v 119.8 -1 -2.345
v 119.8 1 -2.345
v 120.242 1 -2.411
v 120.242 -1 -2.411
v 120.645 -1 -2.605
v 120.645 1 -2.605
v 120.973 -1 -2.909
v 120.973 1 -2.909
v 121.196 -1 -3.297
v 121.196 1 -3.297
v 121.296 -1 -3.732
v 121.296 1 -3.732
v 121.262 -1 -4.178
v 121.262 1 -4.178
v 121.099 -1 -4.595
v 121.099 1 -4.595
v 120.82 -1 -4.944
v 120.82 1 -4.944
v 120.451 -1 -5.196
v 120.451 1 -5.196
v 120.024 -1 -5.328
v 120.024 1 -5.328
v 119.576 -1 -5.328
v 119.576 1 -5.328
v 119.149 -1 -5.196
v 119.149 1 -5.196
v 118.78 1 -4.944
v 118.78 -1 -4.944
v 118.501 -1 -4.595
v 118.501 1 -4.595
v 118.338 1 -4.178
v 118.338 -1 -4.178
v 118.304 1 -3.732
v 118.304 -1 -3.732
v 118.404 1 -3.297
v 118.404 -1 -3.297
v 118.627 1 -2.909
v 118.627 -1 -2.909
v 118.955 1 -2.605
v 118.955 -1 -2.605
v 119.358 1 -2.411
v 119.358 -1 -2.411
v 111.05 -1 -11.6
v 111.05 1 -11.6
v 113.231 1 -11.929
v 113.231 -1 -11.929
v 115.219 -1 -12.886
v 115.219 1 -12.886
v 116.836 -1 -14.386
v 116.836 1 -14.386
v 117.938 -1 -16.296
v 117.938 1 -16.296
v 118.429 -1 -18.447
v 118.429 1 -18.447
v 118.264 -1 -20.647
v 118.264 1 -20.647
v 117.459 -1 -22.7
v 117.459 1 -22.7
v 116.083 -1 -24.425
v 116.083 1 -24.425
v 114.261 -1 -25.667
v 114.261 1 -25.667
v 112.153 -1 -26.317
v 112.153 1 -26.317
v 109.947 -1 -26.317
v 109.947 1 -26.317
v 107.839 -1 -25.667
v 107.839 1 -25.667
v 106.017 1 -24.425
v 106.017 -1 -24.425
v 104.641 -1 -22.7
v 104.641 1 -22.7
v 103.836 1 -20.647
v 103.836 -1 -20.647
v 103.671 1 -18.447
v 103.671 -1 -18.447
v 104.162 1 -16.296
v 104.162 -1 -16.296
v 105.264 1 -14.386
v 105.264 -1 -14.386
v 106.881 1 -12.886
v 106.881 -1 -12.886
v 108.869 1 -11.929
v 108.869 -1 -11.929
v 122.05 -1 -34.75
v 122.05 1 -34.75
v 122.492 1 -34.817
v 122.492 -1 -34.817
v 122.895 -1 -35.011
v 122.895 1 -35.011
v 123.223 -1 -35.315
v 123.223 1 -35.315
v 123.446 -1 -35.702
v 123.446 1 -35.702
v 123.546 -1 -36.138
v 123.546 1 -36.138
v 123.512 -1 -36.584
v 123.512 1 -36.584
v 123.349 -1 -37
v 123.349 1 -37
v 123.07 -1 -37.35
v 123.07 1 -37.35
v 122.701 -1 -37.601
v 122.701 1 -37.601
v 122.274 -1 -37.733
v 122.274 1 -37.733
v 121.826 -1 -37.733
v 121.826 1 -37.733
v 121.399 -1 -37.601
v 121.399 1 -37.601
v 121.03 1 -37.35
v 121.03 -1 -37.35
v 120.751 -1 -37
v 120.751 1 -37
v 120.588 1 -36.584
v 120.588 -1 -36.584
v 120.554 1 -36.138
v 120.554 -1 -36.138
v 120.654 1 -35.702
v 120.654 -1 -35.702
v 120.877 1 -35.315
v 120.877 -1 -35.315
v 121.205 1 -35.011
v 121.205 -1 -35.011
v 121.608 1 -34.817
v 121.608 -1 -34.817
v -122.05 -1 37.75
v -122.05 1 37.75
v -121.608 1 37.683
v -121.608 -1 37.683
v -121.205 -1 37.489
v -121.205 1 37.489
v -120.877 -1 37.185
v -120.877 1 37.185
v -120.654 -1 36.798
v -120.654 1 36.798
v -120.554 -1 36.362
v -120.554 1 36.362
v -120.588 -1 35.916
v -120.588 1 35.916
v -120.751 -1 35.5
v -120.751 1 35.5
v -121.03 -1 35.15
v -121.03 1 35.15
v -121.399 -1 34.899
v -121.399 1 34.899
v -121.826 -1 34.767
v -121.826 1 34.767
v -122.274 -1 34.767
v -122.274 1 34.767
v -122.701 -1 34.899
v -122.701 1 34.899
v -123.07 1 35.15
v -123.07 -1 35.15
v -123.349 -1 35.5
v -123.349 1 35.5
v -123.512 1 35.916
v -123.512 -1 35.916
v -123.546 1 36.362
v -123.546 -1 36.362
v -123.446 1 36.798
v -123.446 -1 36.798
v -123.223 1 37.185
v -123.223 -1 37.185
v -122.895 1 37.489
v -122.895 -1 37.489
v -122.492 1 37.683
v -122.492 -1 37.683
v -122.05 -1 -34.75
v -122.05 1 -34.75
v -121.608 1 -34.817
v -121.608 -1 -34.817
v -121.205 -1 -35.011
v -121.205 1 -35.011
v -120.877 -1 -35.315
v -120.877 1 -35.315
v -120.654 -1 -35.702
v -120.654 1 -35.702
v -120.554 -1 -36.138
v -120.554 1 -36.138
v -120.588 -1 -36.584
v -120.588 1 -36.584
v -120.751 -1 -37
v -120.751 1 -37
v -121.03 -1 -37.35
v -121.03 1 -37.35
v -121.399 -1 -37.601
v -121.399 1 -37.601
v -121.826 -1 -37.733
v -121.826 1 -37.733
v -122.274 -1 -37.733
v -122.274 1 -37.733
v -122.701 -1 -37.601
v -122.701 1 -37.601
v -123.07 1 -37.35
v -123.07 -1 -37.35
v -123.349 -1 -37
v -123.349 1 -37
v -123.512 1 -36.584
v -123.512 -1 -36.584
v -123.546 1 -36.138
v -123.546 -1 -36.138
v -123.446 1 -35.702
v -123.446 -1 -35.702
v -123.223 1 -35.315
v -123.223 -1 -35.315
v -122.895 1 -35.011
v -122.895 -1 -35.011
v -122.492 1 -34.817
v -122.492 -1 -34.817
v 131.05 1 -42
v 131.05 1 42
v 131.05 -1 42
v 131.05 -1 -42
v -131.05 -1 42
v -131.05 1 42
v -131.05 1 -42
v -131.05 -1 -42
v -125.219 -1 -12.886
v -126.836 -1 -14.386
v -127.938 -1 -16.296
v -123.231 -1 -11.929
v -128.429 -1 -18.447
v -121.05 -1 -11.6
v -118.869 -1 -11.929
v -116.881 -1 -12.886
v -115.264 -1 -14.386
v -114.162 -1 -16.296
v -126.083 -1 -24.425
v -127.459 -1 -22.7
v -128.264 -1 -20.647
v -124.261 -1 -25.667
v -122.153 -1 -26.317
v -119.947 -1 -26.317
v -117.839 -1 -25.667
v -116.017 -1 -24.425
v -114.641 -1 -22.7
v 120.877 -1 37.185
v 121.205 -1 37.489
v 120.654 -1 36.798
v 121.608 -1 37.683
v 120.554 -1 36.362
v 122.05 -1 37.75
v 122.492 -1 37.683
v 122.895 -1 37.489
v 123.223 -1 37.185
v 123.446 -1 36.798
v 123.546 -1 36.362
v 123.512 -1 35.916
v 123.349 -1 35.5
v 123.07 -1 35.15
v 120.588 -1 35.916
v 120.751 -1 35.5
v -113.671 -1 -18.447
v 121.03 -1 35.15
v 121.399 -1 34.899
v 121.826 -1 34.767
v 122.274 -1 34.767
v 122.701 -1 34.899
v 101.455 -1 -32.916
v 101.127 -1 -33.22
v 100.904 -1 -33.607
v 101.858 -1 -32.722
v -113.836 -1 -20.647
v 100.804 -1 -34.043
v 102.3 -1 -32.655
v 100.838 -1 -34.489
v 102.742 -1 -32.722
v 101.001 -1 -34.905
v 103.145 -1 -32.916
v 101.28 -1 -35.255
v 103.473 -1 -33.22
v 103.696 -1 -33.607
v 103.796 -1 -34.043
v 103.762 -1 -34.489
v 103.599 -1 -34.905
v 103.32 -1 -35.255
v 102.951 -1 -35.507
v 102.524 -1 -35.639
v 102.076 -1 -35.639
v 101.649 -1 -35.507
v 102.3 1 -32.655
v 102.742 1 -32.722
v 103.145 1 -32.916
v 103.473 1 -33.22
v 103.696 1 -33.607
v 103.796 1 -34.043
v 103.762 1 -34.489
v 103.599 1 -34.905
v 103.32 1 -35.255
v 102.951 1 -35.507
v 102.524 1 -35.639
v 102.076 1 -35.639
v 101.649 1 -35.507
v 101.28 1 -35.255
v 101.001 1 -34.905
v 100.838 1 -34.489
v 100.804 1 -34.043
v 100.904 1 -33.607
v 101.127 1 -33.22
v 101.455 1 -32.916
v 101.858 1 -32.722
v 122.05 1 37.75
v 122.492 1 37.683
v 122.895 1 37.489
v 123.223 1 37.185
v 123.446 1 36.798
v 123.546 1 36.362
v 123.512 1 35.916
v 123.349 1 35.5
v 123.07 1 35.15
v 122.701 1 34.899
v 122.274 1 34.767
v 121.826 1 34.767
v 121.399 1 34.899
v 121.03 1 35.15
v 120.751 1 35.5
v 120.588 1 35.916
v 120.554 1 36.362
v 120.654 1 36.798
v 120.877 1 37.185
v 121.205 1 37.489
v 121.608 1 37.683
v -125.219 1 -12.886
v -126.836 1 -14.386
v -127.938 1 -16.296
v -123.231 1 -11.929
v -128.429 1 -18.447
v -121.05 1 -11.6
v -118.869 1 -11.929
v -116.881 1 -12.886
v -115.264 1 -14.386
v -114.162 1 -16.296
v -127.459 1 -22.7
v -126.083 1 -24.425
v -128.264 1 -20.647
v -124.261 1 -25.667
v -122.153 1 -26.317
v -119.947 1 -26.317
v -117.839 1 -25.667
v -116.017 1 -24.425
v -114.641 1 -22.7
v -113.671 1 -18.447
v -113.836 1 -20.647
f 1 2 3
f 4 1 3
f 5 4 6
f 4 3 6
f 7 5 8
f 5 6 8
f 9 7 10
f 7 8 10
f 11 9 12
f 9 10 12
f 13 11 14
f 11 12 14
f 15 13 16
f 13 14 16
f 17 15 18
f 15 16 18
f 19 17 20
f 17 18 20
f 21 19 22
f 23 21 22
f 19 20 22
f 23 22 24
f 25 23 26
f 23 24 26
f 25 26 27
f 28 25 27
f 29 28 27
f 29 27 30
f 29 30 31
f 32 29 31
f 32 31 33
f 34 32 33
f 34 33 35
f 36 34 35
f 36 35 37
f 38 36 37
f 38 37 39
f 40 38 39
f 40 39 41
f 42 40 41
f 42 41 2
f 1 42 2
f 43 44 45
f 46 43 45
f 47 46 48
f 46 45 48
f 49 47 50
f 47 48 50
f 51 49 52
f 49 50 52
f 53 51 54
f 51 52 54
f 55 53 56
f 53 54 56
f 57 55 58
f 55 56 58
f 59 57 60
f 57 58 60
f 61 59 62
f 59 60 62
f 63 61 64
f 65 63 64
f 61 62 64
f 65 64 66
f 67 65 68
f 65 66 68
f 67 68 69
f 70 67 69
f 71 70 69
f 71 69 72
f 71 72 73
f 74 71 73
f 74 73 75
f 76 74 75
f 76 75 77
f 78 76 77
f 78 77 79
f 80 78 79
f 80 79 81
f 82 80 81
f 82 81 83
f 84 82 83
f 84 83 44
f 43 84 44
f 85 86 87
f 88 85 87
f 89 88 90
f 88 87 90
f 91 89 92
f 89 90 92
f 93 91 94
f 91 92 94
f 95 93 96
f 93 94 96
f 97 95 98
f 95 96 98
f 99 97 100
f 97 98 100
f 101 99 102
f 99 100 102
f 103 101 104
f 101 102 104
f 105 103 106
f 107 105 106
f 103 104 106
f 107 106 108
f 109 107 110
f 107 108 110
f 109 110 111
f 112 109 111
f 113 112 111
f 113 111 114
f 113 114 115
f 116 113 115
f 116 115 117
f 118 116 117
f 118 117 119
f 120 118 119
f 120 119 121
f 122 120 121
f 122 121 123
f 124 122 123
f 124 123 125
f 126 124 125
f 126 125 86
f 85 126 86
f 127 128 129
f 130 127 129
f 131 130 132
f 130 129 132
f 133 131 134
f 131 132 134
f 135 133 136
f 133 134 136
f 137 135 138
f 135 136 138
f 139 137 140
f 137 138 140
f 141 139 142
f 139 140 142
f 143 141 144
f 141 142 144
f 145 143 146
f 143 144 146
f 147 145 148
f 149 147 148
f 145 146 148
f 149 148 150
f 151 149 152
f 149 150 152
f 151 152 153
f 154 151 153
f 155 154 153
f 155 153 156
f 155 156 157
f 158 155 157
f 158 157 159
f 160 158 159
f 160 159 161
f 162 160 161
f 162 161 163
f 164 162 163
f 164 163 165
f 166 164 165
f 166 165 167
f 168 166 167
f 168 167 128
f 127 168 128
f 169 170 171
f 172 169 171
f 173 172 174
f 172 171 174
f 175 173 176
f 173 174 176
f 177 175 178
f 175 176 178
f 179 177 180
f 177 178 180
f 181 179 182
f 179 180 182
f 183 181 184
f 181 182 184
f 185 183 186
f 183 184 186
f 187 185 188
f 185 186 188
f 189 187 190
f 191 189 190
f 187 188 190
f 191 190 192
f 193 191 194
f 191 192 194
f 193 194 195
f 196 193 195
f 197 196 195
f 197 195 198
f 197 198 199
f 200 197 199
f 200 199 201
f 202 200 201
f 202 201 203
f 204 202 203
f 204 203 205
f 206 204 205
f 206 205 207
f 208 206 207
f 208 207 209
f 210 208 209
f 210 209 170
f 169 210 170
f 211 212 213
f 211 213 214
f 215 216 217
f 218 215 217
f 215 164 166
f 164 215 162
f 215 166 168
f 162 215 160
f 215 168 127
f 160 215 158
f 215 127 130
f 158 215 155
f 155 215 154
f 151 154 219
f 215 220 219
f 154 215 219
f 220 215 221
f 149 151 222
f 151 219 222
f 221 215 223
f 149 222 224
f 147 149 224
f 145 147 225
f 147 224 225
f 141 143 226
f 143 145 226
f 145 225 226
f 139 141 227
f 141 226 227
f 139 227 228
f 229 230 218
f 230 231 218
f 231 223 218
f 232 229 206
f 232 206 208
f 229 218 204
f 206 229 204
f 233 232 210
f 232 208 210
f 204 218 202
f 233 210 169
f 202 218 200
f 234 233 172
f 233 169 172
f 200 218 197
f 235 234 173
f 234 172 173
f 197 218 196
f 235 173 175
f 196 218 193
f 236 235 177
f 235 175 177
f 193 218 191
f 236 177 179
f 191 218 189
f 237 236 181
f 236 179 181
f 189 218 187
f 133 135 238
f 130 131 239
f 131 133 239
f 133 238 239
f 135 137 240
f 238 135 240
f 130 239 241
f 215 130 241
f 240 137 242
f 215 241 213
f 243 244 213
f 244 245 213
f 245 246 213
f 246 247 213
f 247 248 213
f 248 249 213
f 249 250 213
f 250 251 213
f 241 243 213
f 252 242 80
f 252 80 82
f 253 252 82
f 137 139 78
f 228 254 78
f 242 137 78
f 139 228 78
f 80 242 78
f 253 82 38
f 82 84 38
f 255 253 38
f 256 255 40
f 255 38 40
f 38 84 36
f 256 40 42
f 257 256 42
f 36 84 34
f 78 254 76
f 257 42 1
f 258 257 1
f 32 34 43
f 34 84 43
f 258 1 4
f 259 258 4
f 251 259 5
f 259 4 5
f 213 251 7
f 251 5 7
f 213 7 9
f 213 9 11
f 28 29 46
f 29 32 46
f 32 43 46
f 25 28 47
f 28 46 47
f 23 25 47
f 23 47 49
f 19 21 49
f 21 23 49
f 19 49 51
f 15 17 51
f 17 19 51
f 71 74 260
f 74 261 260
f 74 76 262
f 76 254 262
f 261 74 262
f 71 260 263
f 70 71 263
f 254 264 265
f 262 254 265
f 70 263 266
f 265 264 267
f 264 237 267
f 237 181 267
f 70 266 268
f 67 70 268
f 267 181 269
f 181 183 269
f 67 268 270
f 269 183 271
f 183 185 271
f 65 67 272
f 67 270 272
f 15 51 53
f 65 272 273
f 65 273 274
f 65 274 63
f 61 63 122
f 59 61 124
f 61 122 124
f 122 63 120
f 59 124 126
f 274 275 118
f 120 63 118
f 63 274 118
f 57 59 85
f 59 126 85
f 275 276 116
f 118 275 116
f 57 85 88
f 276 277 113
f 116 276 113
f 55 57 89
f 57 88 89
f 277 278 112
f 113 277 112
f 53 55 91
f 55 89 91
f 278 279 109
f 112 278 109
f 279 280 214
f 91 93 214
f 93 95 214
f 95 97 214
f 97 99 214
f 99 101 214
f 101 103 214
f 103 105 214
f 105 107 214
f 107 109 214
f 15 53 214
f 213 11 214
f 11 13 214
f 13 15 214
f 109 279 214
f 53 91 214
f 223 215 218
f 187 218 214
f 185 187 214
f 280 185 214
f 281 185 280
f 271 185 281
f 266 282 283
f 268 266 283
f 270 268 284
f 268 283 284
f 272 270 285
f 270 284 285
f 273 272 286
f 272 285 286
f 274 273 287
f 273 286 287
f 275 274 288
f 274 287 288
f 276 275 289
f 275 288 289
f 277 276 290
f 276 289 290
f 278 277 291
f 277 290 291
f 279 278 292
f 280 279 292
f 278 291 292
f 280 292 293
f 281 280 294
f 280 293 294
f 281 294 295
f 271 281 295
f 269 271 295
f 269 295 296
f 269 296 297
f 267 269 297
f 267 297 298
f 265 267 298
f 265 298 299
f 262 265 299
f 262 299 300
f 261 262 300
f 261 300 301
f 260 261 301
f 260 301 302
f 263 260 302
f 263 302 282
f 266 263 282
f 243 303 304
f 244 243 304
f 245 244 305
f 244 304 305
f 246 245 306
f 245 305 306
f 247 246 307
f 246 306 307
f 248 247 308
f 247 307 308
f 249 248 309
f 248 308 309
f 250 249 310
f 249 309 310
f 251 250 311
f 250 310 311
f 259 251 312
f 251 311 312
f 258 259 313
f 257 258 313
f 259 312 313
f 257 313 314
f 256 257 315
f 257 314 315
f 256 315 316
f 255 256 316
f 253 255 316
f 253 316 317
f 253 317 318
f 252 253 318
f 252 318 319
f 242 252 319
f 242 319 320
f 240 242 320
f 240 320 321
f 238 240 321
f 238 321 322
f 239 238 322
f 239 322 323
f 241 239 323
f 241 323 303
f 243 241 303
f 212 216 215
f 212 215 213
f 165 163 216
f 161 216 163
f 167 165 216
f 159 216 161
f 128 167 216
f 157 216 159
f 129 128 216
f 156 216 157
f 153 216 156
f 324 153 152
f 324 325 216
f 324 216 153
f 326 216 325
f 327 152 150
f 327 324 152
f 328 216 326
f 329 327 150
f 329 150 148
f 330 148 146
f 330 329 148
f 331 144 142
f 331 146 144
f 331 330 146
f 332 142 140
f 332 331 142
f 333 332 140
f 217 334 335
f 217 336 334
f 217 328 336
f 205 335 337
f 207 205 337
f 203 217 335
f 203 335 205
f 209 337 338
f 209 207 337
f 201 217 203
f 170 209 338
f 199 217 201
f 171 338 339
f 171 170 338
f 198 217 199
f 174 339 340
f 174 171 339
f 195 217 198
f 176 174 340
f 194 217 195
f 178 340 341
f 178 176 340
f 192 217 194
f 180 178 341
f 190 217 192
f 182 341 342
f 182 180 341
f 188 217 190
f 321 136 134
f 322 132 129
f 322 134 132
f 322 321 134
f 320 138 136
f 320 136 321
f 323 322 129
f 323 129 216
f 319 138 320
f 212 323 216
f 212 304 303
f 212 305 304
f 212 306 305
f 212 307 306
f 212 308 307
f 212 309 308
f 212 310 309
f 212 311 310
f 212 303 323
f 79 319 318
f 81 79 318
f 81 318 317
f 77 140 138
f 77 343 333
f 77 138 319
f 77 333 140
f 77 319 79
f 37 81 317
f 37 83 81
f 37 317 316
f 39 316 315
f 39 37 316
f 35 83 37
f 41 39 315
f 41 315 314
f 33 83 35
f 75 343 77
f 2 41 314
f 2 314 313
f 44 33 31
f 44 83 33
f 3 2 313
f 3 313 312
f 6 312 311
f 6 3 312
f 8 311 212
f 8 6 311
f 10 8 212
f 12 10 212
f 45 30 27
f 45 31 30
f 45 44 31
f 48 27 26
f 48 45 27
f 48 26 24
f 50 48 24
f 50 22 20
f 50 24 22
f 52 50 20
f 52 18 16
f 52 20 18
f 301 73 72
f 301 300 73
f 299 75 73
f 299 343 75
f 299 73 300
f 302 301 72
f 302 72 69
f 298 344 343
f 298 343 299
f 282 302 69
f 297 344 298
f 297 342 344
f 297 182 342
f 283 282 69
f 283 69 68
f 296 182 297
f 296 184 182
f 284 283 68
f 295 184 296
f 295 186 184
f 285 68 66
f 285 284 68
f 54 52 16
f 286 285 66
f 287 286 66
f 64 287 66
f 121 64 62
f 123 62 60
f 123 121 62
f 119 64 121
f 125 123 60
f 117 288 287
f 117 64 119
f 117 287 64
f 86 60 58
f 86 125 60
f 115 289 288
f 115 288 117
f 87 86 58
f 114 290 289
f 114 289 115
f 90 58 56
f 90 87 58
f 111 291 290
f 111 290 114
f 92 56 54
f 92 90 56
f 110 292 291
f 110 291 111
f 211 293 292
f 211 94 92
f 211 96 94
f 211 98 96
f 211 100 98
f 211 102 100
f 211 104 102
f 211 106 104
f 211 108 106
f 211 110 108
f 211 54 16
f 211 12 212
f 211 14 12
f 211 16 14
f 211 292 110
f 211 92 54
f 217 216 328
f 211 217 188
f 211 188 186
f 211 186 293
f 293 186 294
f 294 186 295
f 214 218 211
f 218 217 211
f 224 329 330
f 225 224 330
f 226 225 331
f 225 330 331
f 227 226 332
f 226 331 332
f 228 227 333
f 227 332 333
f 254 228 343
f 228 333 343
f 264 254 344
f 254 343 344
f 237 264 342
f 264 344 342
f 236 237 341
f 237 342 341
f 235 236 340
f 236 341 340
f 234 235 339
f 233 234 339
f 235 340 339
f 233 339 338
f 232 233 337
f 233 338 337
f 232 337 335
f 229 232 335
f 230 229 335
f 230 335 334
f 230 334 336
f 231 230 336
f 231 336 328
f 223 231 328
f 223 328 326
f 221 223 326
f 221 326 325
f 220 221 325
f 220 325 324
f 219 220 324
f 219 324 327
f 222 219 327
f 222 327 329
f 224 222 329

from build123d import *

# Parameters (mm, degrees)
SKETCH_1_W         = 262.1
SKETCH_1_H         = 84
EXTRUDE_1_DEPTH    = 1
SKETCH1_R          = 1.5
CUT_EXTRUDE1_DEPTH = 10
SKETCH4_R          = 7.4
CUT_EXTRUDE3_DEPTH = 138.630310978
SKETCH5_R          = 1.5
CUT_EXTRUDE4_DEPTH = 10


with BuildPart() as part:
    # 草图1 → 凸台-拉伸1 (new, symmetric)
    with BuildSketch(Plane(origin=(0, 0, 0), x_dir=(1, 0, 0), z_dir=(0, 1, 0))):
        Rectangle(SKETCH_1_W, SKETCH_1_H)
    extrude(amount=EXTRUDE_1_DEPTH, both=True)

    # Sketch1 → Cut-Extrude1 (cut)
    with BuildSketch(Plane(origin=(0, 1, 0), x_dir=(1, 0, 0), z_dir=(0, 1, 0))):
        with Locations(Location((-122.05, 36.25, 0), (0, 0, 270))):
            Circle(SKETCH1_R)
        with Locations(Location((-122.05, -36.25, 0), (0, 0, 270))):
            Circle(SKETCH1_R)
        with Locations(Location((122.05, -36.25, 0), (0, 0, 270))):
            Circle(SKETCH1_R)
        with Locations(Location((122.05, 36.25, 0), (0, 0, 270))):
            Circle(SKETCH1_R)
    extrude(amount=-CUT_EXTRUDE1_DEPTH, mode=Mode.SUBTRACT)

    # Sketch4 → Cut-Extrude3 (cut, through all)
    with BuildSketch(Plane(origin=(0, 1, 0), x_dir=(1, 0, 0), z_dir=(0, 1, 0))):
        with Locations(Location((-121.050000944, 19, 0), (0, 0, 270))):
            Circle(SKETCH4_R)
        with Locations(Location((111.049999056, 19, 0), (0, 0, 270))):
            Circle(SKETCH4_R)
    extrude(amount=-CUT_EXTRUDE3_DEPTH, mode=Mode.SUBTRACT)

    # Sketch5 → Cut-Extrude4 (cut)
    with BuildSketch(Plane(origin=(0, 1, 0), x_dir=(1, 0, 0), z_dir=(0, 1, 0))):
        with Locations(Location((119.799998238, 3.844554962, 0), (0, 0, 270))):
            Circle(SKETCH5_R)
        with Locations(Location((102.299999873, 34.155445038, 0), (0, 0, 270))):
            Circle(SKETCH5_R)
    extrude(amount=-CUT_EXTRUDE4_DEPTH, mode=Mode.SUBTRACT)


solid = part.part
